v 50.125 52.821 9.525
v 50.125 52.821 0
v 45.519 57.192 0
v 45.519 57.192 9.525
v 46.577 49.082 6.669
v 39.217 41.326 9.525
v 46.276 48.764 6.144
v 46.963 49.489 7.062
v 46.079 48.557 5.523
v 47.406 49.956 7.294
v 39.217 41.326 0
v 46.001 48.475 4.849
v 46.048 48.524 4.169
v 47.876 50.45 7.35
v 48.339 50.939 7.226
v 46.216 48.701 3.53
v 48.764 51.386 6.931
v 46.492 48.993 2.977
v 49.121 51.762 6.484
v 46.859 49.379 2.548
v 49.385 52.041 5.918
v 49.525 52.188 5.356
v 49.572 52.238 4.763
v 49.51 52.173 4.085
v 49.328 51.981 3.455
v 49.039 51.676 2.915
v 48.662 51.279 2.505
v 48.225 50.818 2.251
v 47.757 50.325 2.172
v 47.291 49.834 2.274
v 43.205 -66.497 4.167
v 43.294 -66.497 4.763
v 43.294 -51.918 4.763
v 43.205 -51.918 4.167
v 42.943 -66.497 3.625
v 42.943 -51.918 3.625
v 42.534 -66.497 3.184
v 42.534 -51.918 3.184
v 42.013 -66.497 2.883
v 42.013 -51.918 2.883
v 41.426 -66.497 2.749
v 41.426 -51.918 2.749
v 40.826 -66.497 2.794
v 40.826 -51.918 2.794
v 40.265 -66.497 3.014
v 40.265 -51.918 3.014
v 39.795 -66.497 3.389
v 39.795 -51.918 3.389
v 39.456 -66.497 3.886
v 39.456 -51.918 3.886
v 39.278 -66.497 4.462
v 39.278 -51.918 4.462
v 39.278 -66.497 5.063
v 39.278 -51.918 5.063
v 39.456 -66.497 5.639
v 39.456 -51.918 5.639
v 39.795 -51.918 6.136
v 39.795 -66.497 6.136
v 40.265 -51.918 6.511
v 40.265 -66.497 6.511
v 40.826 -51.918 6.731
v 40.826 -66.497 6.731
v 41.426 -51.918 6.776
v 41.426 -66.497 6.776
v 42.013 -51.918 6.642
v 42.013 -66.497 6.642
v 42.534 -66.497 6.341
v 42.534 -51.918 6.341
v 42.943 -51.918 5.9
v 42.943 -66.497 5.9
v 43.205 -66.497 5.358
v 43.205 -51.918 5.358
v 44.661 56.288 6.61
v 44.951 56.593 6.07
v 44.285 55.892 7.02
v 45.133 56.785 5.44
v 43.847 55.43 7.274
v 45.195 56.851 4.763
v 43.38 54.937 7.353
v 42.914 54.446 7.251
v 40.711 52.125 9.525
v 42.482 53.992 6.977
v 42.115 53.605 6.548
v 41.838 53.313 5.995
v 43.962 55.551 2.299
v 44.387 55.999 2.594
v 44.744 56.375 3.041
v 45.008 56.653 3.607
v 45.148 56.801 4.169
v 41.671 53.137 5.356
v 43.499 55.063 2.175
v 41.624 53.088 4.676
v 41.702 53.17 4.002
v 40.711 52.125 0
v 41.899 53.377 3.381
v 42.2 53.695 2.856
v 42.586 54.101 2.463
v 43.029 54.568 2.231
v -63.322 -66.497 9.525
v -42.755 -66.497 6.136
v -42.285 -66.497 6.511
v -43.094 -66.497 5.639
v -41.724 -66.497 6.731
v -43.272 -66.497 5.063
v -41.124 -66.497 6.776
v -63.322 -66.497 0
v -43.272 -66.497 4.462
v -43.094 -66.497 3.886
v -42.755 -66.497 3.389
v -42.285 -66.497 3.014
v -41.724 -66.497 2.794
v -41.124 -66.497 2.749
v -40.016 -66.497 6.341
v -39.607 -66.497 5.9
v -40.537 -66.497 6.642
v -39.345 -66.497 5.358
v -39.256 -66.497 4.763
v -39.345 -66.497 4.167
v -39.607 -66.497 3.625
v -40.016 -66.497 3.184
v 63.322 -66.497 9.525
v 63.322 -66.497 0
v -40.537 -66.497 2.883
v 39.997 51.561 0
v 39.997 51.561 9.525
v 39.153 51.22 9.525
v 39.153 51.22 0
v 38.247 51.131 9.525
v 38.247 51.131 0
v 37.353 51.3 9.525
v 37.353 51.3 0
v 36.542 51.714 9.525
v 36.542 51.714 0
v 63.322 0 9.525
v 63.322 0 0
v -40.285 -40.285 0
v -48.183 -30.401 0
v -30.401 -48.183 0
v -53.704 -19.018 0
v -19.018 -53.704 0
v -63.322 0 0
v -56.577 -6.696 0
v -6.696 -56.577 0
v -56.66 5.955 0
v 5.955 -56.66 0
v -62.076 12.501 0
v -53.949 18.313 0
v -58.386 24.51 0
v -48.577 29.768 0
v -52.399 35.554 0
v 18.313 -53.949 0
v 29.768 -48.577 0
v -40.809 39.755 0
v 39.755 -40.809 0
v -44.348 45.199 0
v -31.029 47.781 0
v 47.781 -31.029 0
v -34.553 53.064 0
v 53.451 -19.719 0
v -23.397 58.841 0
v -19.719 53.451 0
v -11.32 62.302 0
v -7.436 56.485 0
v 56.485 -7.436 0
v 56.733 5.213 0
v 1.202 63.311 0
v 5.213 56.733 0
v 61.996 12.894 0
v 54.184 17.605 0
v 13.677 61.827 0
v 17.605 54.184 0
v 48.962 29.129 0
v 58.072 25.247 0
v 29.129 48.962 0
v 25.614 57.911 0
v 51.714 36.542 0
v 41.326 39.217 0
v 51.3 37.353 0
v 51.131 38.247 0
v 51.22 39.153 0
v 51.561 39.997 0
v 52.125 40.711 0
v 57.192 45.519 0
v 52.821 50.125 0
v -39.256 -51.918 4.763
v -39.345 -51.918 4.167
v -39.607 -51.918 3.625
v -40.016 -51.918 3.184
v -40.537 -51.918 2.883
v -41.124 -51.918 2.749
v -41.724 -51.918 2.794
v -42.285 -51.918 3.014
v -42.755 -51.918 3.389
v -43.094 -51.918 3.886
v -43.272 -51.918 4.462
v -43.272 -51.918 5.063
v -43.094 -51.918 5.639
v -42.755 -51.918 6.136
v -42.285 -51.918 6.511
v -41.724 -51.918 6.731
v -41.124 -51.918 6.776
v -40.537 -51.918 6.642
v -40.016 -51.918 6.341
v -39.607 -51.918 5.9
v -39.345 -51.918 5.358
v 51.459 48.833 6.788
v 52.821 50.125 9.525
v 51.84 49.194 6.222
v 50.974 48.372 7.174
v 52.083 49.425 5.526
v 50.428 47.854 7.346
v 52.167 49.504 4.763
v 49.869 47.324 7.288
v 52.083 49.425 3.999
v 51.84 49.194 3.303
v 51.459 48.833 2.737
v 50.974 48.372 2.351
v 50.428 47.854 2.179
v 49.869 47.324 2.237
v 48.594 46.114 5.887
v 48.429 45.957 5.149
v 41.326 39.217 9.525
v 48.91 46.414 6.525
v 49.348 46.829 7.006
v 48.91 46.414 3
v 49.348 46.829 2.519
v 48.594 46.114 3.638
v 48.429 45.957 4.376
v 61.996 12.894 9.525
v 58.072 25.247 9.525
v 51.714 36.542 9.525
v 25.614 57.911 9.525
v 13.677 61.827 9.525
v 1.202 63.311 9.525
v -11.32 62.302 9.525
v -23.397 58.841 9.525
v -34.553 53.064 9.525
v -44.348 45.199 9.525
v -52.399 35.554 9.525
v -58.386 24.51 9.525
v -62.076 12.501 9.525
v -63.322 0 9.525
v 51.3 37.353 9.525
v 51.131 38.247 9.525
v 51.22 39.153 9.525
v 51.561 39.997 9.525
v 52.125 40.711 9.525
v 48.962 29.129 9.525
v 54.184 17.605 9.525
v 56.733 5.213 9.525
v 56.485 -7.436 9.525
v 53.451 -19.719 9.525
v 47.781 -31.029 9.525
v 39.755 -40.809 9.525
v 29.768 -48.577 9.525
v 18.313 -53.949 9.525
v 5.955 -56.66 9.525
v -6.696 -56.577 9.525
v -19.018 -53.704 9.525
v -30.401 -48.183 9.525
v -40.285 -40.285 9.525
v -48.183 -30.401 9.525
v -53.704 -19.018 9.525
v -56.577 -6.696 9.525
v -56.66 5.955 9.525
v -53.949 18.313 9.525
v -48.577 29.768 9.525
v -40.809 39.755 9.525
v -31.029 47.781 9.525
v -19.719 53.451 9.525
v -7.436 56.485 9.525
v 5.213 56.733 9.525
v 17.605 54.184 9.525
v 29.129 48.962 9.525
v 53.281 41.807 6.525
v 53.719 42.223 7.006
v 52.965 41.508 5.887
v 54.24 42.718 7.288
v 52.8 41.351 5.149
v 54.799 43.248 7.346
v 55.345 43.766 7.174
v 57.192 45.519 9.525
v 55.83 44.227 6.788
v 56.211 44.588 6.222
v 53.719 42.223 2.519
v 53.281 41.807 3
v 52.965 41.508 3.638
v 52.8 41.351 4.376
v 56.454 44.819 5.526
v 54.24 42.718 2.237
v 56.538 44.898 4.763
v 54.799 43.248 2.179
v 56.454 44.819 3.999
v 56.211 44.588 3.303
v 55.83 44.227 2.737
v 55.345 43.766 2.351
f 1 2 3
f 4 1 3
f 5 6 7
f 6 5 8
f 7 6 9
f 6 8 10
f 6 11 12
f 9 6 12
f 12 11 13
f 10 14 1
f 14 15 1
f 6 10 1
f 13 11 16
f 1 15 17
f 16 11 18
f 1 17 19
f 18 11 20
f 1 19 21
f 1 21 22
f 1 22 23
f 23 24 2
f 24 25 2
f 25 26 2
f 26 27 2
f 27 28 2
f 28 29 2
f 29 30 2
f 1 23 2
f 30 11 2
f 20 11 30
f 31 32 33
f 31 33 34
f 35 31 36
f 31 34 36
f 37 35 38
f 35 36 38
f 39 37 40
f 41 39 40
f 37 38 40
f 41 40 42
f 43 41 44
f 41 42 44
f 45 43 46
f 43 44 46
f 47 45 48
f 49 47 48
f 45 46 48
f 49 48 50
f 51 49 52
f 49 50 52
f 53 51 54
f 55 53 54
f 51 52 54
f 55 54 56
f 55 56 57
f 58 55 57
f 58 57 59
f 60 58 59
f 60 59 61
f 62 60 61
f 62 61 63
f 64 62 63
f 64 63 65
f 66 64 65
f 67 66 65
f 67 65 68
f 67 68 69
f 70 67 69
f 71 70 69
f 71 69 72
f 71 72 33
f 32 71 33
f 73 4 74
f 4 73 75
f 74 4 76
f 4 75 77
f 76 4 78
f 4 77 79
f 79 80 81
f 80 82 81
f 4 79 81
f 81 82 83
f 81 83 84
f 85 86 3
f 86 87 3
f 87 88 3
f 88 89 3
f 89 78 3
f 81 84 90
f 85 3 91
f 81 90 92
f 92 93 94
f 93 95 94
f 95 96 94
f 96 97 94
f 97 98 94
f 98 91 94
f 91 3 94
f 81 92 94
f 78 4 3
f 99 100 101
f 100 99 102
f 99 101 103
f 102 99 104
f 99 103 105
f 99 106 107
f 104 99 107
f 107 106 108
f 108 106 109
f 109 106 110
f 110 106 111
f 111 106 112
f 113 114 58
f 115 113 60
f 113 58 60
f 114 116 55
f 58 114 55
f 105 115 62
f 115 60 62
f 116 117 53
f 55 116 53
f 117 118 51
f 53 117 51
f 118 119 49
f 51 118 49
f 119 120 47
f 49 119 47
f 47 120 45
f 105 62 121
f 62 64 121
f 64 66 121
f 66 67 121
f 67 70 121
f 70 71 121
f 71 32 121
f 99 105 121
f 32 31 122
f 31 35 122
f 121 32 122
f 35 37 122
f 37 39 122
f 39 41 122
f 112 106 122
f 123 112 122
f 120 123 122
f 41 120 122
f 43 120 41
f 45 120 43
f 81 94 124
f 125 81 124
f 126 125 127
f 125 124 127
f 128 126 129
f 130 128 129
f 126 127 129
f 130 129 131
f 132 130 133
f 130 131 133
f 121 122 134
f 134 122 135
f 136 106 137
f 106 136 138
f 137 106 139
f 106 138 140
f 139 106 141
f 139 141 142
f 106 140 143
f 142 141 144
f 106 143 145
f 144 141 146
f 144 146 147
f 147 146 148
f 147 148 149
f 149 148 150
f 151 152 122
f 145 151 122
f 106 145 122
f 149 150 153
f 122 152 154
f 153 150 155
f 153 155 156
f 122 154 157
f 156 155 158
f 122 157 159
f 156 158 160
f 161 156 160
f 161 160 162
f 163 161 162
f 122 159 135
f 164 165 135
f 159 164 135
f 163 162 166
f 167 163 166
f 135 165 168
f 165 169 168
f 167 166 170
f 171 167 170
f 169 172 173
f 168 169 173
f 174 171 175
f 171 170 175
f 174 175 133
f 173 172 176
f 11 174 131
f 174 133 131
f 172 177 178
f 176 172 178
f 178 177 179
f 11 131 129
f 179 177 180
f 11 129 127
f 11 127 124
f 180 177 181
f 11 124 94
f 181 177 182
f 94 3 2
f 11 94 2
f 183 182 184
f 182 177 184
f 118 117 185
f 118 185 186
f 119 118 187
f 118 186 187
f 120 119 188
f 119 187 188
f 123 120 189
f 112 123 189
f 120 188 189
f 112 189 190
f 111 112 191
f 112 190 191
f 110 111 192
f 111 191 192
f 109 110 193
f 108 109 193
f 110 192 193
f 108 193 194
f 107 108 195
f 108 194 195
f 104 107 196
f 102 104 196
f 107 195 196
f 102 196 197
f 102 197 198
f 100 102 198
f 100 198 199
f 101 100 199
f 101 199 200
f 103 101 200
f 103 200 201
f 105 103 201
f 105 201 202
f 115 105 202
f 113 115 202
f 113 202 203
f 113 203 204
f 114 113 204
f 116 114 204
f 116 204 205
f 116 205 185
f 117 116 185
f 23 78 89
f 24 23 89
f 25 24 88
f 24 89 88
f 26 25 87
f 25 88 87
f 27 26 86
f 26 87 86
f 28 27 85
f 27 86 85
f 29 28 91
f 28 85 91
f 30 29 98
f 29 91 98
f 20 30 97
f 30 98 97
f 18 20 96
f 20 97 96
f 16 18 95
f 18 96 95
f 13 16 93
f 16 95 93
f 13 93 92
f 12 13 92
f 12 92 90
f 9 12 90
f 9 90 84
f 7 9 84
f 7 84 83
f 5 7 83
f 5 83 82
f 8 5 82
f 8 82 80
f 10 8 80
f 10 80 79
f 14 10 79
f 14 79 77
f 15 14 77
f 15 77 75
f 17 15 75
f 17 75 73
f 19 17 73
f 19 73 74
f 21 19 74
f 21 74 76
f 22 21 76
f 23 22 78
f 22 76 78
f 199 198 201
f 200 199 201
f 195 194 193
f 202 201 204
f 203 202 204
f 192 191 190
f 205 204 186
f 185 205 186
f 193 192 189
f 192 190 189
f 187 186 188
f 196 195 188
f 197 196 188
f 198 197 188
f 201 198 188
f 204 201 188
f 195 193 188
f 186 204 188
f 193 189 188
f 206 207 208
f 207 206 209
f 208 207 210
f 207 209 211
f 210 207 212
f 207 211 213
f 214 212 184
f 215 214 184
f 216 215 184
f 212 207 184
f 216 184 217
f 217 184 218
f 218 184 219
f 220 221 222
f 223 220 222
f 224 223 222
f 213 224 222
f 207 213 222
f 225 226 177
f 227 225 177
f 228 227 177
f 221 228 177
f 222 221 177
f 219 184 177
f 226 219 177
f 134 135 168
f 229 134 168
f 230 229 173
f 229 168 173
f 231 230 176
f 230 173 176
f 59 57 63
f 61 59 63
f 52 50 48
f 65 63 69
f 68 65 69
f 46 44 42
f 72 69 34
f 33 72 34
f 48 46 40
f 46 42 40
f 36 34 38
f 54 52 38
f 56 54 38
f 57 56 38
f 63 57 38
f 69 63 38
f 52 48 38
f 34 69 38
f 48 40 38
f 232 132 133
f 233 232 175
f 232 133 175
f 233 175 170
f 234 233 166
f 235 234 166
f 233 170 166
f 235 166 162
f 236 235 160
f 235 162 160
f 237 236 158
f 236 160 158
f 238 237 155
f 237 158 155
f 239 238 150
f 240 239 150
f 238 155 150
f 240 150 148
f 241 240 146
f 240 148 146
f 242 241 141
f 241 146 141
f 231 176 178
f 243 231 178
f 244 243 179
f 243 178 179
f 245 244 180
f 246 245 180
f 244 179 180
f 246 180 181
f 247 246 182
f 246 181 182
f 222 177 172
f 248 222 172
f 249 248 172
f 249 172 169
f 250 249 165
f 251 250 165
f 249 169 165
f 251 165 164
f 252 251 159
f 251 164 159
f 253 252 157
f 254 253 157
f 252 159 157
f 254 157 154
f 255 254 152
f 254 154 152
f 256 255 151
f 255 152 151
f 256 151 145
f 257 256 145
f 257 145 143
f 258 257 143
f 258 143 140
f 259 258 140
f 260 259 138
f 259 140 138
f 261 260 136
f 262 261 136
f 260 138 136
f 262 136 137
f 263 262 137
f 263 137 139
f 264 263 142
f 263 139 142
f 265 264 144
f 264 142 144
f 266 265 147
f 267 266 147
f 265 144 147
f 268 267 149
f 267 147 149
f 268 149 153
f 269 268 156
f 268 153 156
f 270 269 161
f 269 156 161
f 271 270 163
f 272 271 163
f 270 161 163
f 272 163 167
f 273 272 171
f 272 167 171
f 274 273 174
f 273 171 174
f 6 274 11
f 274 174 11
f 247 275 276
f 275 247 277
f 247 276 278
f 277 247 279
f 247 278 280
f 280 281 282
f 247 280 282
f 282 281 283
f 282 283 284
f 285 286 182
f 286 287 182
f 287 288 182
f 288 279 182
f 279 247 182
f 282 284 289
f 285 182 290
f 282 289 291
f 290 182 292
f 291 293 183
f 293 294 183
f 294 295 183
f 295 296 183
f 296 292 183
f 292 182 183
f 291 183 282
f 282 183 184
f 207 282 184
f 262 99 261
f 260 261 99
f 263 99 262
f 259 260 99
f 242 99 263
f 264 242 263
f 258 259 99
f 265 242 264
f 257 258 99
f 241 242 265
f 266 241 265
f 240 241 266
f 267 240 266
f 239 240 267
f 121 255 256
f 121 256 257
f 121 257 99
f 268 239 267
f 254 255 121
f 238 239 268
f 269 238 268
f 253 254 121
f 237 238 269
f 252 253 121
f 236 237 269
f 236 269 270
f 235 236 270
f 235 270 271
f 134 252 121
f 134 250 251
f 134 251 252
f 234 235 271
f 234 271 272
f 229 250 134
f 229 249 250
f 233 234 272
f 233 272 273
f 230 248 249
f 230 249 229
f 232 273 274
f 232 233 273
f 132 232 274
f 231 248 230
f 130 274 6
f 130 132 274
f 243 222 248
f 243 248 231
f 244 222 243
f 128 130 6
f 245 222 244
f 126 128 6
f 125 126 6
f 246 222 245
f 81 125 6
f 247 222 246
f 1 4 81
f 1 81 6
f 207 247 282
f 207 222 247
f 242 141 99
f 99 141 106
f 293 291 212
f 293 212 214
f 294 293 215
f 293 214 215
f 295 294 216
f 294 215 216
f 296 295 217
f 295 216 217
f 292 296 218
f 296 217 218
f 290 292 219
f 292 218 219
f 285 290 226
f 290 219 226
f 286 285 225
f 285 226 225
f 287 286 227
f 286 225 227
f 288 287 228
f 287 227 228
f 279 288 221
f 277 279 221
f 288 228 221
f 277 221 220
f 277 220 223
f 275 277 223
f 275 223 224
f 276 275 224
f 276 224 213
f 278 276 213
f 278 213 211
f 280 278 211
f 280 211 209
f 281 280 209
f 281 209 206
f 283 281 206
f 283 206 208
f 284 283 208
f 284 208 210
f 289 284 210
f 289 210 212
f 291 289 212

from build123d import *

# Parameters (mm, degrees)
BOSS_EXTRUDE1_DEPTH        = 9.525
F_10_32_TAPPED_HOLE2_D     = 4.0386
F_10_32_TAPPED_HOLE2_DEPTH = 14.5796
F_6_0_204_DIAMETER_HOLE1_D = 5.1816


with BuildPart() as part:
    # Sketch1 → Boss-Extrude1 (new body)
    with BuildSketch(Plane.XY):
        with BuildLine():
            Line((-63.3222, 0), (-63.3222, -66.4972))
            Line((-63.3222, -66.4972), (63.3222, -66.4972))
            Line((63.3222, -66.4972), (63.3222, 0))
            ThreePointArc((63.3222, 0), (60.350483171, 19.170816203), (51.714258587, 36.542255974))
            ThreePointArc((51.714258587, 36.542255974), (51.142998099, 38.702969527), (52.124965643, 40.710645135))
            Line((52.124965643, 40.710645135), (57.191705625, 45.518801846))
            Line((57.191705625, 45.518801846), (52.820654069, 50.124929102))
            Line((52.820654069, 50.124929102), (41.32617374, 39.217074557))
            ThreePointArc((41.32617374, 39.217074557), (-40.285428959, -40.285428959), (39.217074557, 41.32617374))
            Line((39.217074557, 41.32617374), (50.124929102, 52.820654069))
            Line((50.124929102, 52.820654069), (45.518801846, 57.191705625))
            Line((45.518801846, 57.191705625), (40.710645135, 52.124965643))
            ThreePointArc((40.710645135, 52.124965643), (38.702969527, 51.142998099), (36.542255974, 51.714258587))
            ThreePointArc((36.542255974, 51.714258587), (-29.11842176, 56.230050036), (-63.3222, 0))
        make_face()
    extrude(amount=BOSS_EXTRUDE1_DEPTH)

    # #10-32 Tapped Hole2
    with Locations(Plane(origin=(0, -66.4972, 0), x_dir=(-1, 0, 0), z_dir=(0, -1, 0))):
        with Locations((-41.275, -4.7625), (41.275, -4.7625)):
            Hole(F_10_32_TAPPED_HOLE2_D / 2, depth=F_10_32_TAPPED_HOLE2_DEPTH)

    # #6 (0.204) Diameter Hole1 (through all)
    with Locations(Plane(origin=(54.658335634, 43.114723491, 4.7625), x_dir=(-0.725374371012, -0.688354575694, 0), z_dir=(0.688354575694, -0.725374371012, 0))):
        with Locations((0, 0)):
            Hole(F_6_0_204_DIAMETER_HOLE1_D / 2)


solid = part.part
